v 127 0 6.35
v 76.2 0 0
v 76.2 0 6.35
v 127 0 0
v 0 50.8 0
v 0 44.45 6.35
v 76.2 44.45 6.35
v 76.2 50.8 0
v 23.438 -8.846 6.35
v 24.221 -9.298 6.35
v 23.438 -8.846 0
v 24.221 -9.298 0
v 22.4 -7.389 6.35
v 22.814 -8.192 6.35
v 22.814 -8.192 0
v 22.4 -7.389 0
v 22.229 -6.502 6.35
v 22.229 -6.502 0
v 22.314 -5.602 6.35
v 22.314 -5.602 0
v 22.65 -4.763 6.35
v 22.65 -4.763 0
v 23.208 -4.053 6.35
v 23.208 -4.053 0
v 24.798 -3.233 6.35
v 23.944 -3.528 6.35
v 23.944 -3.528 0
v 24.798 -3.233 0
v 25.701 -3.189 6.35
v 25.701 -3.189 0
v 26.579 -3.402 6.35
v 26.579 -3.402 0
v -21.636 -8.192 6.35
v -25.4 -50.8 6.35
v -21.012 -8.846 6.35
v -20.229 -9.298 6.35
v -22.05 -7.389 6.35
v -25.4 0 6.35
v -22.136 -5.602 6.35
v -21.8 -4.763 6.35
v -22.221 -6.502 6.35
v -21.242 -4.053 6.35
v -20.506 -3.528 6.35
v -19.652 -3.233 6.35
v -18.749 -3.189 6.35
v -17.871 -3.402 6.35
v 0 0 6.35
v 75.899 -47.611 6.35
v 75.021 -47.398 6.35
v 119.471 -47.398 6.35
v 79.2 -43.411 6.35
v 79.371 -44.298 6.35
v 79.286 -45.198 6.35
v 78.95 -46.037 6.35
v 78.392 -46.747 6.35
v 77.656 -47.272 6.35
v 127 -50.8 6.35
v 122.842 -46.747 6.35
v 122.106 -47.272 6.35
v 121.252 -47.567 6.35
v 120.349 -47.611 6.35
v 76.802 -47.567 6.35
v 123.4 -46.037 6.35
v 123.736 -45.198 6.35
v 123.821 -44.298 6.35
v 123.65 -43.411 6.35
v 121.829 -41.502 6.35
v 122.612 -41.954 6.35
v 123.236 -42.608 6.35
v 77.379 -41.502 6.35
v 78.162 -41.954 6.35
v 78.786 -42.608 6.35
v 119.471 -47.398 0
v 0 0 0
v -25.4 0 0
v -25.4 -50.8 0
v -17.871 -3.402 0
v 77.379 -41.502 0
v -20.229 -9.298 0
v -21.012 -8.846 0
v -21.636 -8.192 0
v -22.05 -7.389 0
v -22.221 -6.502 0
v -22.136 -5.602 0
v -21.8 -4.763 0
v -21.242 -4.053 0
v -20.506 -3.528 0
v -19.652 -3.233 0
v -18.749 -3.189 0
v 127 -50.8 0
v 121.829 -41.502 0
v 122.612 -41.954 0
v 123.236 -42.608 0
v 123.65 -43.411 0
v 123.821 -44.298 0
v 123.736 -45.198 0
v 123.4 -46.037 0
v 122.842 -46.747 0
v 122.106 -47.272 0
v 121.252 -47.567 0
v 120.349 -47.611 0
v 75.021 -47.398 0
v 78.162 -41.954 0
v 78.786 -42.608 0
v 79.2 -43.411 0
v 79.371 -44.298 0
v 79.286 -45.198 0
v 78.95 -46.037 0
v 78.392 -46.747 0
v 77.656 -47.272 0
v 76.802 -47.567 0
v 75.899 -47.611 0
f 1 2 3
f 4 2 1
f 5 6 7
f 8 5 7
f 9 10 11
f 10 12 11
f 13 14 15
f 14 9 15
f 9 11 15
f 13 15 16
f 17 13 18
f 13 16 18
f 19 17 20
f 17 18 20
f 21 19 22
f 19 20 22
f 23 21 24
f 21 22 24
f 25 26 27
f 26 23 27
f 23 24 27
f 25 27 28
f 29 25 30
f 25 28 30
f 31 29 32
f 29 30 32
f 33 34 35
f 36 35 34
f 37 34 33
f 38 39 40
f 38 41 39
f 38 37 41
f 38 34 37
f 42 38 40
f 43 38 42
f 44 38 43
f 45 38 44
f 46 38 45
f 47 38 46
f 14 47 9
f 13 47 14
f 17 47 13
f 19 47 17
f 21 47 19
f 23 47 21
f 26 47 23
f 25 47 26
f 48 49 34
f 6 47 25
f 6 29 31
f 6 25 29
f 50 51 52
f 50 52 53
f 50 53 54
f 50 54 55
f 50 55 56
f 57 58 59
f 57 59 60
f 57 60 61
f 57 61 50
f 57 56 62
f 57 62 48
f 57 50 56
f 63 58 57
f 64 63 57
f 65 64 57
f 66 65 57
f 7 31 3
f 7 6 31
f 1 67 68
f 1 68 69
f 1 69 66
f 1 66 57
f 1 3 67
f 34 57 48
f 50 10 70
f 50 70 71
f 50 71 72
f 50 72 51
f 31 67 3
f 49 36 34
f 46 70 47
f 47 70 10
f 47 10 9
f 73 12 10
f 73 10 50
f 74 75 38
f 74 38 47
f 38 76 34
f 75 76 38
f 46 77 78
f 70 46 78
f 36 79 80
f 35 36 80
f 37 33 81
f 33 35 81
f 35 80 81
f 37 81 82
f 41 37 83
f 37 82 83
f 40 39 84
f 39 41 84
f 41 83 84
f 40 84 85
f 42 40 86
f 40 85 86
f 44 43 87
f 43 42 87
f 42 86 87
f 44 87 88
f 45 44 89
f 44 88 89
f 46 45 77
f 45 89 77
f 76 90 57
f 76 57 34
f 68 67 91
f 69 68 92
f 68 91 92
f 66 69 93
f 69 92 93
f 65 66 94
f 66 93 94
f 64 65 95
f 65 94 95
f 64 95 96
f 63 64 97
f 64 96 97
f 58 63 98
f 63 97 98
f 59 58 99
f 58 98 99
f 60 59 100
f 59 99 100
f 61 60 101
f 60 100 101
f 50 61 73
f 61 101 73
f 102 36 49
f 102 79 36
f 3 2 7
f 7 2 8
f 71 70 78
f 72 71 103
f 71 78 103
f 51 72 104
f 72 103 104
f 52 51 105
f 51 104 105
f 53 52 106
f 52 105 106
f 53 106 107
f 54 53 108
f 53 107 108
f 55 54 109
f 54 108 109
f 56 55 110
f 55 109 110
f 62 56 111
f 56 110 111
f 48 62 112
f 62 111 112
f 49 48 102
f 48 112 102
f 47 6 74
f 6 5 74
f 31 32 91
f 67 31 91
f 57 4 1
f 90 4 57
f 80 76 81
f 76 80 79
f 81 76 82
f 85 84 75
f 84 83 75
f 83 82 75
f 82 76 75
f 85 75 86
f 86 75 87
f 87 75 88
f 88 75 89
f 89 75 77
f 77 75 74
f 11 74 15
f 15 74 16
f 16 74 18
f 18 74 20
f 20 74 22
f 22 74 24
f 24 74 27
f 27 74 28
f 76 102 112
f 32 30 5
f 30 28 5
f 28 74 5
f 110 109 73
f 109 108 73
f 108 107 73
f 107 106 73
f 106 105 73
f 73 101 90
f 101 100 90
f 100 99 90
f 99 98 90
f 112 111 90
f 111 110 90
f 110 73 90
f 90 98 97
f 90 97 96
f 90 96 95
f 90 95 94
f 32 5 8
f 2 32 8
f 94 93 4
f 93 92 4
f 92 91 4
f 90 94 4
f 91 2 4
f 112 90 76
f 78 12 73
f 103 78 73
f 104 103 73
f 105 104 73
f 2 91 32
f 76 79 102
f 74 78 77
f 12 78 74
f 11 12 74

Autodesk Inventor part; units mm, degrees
ref_plane "YZ Plane" through (0, 0, 0) normal (1, 0, 0) x (0, 1, 0)
ref_plane "XZ Plane" through (0, 0, 0) normal (0, 1, 0) x (-1, 0, 0)
ref_plane "XY Plane" through (0, 0, 0) normal (0, 0, 1) x (1, 0, 0)
sketch "Sketch2" plane through (0, 0, 0) normal (0, 0, 1) x (1, 0, 0)
  line L0 (0, 0) -> (76.2, 0)
  line L1 (76.2, 0) -> (76.2, 50.8)
  line L2 (76.2, 50.8) -> (0, 50.8)
  line L3 (0, 50.8) -> (0, 0)
  line L4 (-25.4, 0) -> (127, 0)
  line L5 (127, 0) -> (127, -50.8)
  line L6 (127, -50.8) -> (-25.4, -50.8)
  line L7 (-25.4, -50.8) -> (-25.4, 0)
  circle A0 centre (-19.05, -6.35) radius 3.175
  circle A1 centre (76.2, -44.45) radius 3.175
  line L8 (-17.8708, -3.4021) -> (77.3792, -41.5021)
  line L9 (-20.2292, -9.2979) -> (75.0208, -47.3979)
  circle A2 centre (25.4, -6.35) radius 3.175
  circle A3 centre (120.65, -44.45) radius 3.175
  line L10 (26.5792, -3.4021) -> (121.8292, -41.5021)
  line L11 (24.2208, -9.2979) -> (119.4708, -47.3979)
  dimension "d0" = 76.2
  dimension "d1" = 50.8
  dimension "d2" = 152.4
  dimension "d3" = 50.8
  dimension "d4" = 25.4
  dimension "d5" = 6.35
  dimension "d6" = 6.35
  dimension "d7" = 6.35
  dimension "d8" = 6.35
  dimension "d9" = 6.35
  dimension "d10" = 6.35
  dimension "d11" = 6.35
  dimension "d12" = 6.35
extrude "Extrusion1" add sketch "Sketch2" along normal blind 6.35
chamfer "Chamfer1" distance 6.35 angle 45 1 edges at (38.1, 50.8, 6.35)
properties part number "Short Wall Lift"
